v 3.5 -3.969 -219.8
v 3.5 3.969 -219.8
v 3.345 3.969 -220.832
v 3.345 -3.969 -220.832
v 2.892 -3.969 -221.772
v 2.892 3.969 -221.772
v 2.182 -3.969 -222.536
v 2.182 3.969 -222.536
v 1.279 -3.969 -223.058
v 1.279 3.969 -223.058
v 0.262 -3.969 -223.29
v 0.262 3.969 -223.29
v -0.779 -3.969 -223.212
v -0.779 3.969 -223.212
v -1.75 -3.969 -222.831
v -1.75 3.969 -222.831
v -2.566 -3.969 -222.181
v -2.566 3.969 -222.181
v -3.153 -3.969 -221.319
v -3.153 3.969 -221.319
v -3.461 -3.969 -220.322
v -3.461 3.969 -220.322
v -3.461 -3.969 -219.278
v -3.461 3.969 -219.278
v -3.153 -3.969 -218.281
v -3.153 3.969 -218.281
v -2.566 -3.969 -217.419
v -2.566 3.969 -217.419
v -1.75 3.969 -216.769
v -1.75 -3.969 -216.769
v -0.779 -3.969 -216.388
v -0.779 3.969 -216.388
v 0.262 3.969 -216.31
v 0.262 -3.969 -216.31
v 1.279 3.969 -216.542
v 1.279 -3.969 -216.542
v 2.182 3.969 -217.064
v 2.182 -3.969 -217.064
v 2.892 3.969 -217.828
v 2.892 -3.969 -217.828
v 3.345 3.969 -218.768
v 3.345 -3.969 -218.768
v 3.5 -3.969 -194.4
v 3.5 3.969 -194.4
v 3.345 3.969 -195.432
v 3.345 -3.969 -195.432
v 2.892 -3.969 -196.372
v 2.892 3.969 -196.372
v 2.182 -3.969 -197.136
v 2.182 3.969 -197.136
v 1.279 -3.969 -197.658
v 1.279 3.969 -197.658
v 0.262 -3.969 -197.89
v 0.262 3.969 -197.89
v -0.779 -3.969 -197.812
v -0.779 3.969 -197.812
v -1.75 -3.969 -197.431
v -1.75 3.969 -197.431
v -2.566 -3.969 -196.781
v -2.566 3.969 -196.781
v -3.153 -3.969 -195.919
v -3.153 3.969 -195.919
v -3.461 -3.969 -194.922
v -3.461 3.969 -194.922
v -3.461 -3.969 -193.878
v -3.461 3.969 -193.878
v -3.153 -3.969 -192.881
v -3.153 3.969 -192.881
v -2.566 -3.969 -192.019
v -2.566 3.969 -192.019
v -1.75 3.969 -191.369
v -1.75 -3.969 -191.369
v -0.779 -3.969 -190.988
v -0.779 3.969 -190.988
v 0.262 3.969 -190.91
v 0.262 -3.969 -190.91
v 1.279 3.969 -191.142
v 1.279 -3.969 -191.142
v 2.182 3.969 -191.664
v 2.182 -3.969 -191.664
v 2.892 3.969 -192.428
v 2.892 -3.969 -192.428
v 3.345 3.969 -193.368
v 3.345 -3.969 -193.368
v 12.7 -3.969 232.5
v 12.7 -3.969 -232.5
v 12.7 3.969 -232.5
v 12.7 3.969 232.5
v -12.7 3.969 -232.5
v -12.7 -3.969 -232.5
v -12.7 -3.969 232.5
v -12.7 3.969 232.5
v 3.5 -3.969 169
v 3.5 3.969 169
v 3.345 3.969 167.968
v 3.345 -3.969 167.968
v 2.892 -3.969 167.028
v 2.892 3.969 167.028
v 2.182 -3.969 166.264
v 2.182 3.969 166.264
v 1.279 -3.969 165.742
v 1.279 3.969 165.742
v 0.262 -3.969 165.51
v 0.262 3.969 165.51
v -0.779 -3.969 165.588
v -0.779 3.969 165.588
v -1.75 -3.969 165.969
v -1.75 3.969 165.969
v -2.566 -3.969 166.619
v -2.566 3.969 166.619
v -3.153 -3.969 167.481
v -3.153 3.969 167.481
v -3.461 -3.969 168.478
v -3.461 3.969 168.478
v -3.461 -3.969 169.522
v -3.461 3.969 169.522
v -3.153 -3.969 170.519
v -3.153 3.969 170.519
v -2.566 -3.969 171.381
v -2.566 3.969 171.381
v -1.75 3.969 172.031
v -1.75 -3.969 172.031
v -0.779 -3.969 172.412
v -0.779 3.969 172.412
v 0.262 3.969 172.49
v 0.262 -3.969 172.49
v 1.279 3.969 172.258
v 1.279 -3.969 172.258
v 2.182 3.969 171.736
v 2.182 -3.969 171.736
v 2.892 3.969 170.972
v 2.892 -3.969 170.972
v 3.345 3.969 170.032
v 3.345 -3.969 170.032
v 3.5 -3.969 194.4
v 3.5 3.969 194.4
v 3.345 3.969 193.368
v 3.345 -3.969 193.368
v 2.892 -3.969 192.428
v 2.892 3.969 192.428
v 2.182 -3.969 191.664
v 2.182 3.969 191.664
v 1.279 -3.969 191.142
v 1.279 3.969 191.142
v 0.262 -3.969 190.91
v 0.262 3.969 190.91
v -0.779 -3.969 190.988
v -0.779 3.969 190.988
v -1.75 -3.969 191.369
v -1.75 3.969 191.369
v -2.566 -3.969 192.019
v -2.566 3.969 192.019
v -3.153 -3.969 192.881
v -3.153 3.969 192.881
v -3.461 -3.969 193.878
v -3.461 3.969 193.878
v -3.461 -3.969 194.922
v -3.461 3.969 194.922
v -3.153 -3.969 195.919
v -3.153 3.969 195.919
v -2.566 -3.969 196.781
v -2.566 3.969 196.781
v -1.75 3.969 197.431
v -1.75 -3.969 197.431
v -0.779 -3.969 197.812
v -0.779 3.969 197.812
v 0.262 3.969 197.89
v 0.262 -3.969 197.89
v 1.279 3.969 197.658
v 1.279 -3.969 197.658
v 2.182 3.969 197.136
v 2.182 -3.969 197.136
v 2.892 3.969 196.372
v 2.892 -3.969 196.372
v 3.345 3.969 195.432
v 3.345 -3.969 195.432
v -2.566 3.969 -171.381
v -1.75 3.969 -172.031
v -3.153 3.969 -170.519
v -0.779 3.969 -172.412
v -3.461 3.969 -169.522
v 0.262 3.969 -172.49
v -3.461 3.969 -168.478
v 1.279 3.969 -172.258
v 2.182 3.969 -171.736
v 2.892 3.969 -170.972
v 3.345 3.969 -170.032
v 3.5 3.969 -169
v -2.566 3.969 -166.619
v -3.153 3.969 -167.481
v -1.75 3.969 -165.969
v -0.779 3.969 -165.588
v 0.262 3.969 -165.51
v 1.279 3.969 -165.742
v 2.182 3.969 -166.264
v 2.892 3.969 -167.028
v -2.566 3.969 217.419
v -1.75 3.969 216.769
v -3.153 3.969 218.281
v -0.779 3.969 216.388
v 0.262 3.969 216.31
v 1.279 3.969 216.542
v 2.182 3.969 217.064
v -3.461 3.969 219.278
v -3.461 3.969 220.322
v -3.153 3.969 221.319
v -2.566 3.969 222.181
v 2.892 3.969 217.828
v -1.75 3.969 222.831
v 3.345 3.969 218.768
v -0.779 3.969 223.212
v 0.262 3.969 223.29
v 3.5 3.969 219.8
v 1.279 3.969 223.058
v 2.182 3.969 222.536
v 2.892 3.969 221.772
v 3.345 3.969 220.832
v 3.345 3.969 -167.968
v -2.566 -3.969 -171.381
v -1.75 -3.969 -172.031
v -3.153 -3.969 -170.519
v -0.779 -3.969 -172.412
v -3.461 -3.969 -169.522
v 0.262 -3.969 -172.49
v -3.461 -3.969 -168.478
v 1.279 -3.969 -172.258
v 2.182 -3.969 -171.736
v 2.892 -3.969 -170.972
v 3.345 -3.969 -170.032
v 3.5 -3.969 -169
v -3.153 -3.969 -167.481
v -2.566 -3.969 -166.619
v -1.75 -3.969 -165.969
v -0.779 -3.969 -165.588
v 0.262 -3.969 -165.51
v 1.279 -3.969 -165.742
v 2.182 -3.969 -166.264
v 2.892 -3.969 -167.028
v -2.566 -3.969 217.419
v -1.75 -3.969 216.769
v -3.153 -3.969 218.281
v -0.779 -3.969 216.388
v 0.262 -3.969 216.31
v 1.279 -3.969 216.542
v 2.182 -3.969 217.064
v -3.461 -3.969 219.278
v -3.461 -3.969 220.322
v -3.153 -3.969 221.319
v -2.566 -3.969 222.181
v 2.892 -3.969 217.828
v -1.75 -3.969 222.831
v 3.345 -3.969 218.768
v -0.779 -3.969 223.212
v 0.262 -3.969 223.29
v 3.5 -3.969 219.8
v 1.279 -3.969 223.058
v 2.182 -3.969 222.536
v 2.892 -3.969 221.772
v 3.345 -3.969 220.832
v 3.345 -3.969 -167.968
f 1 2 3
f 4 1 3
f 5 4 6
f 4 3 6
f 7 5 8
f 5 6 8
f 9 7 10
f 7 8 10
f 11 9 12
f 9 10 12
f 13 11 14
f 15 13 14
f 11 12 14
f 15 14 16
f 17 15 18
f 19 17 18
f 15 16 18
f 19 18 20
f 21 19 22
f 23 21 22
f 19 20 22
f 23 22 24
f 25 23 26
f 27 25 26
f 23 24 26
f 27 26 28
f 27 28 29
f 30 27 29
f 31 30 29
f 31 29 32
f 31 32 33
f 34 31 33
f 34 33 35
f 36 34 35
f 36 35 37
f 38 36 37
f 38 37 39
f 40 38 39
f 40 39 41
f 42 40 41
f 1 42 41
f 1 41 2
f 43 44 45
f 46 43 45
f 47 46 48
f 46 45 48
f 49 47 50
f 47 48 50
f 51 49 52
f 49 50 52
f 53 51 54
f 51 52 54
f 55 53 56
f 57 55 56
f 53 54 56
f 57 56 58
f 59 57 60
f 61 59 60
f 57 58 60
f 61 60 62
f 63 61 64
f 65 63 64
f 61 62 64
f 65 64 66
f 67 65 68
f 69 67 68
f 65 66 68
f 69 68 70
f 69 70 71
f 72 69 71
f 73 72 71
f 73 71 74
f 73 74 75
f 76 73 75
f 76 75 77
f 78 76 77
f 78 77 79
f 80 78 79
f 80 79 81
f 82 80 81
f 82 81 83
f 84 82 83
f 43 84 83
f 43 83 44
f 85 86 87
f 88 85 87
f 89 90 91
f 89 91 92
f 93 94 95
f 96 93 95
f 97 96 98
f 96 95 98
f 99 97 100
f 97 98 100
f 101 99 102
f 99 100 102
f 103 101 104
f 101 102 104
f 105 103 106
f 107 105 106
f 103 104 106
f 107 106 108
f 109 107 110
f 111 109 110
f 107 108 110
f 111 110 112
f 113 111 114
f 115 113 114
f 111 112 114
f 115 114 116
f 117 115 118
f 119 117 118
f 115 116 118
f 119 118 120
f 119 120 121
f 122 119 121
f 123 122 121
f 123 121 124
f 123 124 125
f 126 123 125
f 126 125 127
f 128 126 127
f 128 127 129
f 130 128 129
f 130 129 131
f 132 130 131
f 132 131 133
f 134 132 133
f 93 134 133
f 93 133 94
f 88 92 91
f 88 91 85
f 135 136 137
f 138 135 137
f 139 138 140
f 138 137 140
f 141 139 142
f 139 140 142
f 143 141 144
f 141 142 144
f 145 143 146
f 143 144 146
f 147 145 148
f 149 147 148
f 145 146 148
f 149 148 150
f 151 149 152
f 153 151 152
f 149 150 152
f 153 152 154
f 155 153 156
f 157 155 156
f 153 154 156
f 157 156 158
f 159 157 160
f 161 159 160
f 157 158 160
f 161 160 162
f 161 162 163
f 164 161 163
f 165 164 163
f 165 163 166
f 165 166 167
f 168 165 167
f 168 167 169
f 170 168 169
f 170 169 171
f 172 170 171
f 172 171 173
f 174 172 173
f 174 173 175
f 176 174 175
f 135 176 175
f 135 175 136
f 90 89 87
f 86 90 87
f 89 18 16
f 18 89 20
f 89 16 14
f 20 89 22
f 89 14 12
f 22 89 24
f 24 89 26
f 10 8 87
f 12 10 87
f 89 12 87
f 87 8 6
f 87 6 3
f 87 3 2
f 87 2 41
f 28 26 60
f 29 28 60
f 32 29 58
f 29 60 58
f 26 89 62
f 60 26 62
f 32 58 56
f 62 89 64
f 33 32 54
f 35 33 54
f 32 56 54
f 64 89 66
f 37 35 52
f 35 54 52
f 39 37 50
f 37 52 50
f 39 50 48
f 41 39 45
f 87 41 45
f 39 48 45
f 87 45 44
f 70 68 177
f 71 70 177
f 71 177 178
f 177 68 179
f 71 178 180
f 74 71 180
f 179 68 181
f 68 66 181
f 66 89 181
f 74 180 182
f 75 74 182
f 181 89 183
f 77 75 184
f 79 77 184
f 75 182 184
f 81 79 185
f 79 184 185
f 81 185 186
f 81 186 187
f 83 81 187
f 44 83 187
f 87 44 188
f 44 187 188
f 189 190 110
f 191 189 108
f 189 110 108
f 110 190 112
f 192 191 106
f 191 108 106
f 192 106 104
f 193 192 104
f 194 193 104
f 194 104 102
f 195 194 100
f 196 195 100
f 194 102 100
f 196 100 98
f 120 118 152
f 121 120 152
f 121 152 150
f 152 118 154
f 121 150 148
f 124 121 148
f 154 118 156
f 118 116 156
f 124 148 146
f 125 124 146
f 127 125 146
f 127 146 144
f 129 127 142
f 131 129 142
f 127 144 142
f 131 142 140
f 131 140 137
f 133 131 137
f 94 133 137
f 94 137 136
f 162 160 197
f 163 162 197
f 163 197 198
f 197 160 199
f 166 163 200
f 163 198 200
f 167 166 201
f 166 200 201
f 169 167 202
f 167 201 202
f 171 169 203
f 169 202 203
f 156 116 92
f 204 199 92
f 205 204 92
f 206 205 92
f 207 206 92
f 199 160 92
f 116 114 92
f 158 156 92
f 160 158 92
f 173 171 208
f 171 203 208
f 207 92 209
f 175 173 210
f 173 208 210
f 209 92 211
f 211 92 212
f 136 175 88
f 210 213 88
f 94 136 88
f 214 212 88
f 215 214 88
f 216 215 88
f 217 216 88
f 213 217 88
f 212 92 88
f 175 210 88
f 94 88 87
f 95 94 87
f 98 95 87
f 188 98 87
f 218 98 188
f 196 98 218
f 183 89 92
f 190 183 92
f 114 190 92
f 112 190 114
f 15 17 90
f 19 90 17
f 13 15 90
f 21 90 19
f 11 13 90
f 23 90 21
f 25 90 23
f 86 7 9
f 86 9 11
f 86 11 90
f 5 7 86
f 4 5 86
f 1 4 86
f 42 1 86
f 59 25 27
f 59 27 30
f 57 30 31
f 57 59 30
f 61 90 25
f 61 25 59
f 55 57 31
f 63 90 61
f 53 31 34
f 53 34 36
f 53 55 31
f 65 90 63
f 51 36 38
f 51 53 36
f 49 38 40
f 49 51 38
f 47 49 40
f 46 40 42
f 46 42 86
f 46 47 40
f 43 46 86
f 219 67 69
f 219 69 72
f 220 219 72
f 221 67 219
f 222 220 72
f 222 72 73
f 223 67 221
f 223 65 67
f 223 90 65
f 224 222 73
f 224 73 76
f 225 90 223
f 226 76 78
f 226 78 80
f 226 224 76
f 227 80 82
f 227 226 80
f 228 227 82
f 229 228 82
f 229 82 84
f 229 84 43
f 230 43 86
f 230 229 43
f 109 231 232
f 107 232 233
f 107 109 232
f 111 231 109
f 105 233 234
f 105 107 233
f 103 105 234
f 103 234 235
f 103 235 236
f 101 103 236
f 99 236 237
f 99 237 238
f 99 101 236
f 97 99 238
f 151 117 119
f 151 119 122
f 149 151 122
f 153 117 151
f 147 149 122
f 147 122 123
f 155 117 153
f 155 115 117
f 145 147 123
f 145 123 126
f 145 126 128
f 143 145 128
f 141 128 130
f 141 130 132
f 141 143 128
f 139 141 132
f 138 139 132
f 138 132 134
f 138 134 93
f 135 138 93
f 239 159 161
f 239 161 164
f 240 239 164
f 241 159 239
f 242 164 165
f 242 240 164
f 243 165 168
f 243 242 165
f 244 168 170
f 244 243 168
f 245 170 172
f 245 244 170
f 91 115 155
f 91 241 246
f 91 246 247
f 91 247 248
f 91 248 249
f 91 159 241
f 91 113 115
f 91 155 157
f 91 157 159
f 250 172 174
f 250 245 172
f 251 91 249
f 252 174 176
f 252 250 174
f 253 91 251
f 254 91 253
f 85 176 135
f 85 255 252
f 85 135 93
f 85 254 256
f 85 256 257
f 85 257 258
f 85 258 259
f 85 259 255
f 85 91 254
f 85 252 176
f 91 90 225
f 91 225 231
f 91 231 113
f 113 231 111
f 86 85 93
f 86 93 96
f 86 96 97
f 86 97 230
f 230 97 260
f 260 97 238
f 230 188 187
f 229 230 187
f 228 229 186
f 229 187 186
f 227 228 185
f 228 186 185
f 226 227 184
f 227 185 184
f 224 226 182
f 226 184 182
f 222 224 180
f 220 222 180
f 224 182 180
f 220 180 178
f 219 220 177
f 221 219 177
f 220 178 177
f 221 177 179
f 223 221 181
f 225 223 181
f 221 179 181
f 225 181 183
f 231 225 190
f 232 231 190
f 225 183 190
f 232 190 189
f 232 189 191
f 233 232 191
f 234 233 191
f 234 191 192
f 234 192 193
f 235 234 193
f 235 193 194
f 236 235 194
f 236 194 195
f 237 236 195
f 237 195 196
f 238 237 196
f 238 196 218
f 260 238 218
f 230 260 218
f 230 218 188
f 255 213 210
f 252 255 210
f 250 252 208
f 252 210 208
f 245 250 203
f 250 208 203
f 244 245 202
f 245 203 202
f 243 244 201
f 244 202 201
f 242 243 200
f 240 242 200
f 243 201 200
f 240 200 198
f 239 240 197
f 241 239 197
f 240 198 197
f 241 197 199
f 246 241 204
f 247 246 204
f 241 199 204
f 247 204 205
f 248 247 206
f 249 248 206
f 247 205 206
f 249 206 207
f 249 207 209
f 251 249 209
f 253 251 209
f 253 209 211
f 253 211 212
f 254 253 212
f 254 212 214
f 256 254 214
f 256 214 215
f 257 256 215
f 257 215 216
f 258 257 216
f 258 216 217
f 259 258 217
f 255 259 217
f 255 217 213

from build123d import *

# Parameters (mm, degrees)
SKETCH3_W           = 25.4
SKETCH3_H           = 7.9375
BOSS_EXTRUDE1_DEPTH = 232.5
SKETCH4_R           = 3.5
CUT_EXTRUDE1_DEPTH  = 8.9375


with BuildPart() as part:
    # Sketch3 → Boss-Extrude1 (new body, symmetric)
    with BuildSketch(Plane.XY):
        Rectangle(SKETCH3_W, SKETCH3_H)
    extrude(amount=BOSS_EXTRUDE1_DEPTH, both=True)

    # Sketch4 → Cut-Extrude1 (cut, through all)
    with BuildSketch(Plane(origin=(0, 3.96875, 0), x_dir=(1, 0, 0), z_dir=(0, 1, 0))):
        with Locations((0, 219.8)):
            Circle(SKETCH4_R)
        with Locations((0, 194.4)):
            Circle(SKETCH4_R)
        with Locations((0, 169)):
            Circle(SKETCH4_R)
        with Locations((0, -169)):
            Circle(SKETCH4_R)
        with Locations((0, -194.4)):
            Circle(SKETCH4_R)
        with Locations((0, -219.8)):
            Circle(SKETCH4_R)
    extrude(amount=-CUT_EXTRUDE1_DEPTH, mode=Mode.SUBTRACT)


solid = part.part
